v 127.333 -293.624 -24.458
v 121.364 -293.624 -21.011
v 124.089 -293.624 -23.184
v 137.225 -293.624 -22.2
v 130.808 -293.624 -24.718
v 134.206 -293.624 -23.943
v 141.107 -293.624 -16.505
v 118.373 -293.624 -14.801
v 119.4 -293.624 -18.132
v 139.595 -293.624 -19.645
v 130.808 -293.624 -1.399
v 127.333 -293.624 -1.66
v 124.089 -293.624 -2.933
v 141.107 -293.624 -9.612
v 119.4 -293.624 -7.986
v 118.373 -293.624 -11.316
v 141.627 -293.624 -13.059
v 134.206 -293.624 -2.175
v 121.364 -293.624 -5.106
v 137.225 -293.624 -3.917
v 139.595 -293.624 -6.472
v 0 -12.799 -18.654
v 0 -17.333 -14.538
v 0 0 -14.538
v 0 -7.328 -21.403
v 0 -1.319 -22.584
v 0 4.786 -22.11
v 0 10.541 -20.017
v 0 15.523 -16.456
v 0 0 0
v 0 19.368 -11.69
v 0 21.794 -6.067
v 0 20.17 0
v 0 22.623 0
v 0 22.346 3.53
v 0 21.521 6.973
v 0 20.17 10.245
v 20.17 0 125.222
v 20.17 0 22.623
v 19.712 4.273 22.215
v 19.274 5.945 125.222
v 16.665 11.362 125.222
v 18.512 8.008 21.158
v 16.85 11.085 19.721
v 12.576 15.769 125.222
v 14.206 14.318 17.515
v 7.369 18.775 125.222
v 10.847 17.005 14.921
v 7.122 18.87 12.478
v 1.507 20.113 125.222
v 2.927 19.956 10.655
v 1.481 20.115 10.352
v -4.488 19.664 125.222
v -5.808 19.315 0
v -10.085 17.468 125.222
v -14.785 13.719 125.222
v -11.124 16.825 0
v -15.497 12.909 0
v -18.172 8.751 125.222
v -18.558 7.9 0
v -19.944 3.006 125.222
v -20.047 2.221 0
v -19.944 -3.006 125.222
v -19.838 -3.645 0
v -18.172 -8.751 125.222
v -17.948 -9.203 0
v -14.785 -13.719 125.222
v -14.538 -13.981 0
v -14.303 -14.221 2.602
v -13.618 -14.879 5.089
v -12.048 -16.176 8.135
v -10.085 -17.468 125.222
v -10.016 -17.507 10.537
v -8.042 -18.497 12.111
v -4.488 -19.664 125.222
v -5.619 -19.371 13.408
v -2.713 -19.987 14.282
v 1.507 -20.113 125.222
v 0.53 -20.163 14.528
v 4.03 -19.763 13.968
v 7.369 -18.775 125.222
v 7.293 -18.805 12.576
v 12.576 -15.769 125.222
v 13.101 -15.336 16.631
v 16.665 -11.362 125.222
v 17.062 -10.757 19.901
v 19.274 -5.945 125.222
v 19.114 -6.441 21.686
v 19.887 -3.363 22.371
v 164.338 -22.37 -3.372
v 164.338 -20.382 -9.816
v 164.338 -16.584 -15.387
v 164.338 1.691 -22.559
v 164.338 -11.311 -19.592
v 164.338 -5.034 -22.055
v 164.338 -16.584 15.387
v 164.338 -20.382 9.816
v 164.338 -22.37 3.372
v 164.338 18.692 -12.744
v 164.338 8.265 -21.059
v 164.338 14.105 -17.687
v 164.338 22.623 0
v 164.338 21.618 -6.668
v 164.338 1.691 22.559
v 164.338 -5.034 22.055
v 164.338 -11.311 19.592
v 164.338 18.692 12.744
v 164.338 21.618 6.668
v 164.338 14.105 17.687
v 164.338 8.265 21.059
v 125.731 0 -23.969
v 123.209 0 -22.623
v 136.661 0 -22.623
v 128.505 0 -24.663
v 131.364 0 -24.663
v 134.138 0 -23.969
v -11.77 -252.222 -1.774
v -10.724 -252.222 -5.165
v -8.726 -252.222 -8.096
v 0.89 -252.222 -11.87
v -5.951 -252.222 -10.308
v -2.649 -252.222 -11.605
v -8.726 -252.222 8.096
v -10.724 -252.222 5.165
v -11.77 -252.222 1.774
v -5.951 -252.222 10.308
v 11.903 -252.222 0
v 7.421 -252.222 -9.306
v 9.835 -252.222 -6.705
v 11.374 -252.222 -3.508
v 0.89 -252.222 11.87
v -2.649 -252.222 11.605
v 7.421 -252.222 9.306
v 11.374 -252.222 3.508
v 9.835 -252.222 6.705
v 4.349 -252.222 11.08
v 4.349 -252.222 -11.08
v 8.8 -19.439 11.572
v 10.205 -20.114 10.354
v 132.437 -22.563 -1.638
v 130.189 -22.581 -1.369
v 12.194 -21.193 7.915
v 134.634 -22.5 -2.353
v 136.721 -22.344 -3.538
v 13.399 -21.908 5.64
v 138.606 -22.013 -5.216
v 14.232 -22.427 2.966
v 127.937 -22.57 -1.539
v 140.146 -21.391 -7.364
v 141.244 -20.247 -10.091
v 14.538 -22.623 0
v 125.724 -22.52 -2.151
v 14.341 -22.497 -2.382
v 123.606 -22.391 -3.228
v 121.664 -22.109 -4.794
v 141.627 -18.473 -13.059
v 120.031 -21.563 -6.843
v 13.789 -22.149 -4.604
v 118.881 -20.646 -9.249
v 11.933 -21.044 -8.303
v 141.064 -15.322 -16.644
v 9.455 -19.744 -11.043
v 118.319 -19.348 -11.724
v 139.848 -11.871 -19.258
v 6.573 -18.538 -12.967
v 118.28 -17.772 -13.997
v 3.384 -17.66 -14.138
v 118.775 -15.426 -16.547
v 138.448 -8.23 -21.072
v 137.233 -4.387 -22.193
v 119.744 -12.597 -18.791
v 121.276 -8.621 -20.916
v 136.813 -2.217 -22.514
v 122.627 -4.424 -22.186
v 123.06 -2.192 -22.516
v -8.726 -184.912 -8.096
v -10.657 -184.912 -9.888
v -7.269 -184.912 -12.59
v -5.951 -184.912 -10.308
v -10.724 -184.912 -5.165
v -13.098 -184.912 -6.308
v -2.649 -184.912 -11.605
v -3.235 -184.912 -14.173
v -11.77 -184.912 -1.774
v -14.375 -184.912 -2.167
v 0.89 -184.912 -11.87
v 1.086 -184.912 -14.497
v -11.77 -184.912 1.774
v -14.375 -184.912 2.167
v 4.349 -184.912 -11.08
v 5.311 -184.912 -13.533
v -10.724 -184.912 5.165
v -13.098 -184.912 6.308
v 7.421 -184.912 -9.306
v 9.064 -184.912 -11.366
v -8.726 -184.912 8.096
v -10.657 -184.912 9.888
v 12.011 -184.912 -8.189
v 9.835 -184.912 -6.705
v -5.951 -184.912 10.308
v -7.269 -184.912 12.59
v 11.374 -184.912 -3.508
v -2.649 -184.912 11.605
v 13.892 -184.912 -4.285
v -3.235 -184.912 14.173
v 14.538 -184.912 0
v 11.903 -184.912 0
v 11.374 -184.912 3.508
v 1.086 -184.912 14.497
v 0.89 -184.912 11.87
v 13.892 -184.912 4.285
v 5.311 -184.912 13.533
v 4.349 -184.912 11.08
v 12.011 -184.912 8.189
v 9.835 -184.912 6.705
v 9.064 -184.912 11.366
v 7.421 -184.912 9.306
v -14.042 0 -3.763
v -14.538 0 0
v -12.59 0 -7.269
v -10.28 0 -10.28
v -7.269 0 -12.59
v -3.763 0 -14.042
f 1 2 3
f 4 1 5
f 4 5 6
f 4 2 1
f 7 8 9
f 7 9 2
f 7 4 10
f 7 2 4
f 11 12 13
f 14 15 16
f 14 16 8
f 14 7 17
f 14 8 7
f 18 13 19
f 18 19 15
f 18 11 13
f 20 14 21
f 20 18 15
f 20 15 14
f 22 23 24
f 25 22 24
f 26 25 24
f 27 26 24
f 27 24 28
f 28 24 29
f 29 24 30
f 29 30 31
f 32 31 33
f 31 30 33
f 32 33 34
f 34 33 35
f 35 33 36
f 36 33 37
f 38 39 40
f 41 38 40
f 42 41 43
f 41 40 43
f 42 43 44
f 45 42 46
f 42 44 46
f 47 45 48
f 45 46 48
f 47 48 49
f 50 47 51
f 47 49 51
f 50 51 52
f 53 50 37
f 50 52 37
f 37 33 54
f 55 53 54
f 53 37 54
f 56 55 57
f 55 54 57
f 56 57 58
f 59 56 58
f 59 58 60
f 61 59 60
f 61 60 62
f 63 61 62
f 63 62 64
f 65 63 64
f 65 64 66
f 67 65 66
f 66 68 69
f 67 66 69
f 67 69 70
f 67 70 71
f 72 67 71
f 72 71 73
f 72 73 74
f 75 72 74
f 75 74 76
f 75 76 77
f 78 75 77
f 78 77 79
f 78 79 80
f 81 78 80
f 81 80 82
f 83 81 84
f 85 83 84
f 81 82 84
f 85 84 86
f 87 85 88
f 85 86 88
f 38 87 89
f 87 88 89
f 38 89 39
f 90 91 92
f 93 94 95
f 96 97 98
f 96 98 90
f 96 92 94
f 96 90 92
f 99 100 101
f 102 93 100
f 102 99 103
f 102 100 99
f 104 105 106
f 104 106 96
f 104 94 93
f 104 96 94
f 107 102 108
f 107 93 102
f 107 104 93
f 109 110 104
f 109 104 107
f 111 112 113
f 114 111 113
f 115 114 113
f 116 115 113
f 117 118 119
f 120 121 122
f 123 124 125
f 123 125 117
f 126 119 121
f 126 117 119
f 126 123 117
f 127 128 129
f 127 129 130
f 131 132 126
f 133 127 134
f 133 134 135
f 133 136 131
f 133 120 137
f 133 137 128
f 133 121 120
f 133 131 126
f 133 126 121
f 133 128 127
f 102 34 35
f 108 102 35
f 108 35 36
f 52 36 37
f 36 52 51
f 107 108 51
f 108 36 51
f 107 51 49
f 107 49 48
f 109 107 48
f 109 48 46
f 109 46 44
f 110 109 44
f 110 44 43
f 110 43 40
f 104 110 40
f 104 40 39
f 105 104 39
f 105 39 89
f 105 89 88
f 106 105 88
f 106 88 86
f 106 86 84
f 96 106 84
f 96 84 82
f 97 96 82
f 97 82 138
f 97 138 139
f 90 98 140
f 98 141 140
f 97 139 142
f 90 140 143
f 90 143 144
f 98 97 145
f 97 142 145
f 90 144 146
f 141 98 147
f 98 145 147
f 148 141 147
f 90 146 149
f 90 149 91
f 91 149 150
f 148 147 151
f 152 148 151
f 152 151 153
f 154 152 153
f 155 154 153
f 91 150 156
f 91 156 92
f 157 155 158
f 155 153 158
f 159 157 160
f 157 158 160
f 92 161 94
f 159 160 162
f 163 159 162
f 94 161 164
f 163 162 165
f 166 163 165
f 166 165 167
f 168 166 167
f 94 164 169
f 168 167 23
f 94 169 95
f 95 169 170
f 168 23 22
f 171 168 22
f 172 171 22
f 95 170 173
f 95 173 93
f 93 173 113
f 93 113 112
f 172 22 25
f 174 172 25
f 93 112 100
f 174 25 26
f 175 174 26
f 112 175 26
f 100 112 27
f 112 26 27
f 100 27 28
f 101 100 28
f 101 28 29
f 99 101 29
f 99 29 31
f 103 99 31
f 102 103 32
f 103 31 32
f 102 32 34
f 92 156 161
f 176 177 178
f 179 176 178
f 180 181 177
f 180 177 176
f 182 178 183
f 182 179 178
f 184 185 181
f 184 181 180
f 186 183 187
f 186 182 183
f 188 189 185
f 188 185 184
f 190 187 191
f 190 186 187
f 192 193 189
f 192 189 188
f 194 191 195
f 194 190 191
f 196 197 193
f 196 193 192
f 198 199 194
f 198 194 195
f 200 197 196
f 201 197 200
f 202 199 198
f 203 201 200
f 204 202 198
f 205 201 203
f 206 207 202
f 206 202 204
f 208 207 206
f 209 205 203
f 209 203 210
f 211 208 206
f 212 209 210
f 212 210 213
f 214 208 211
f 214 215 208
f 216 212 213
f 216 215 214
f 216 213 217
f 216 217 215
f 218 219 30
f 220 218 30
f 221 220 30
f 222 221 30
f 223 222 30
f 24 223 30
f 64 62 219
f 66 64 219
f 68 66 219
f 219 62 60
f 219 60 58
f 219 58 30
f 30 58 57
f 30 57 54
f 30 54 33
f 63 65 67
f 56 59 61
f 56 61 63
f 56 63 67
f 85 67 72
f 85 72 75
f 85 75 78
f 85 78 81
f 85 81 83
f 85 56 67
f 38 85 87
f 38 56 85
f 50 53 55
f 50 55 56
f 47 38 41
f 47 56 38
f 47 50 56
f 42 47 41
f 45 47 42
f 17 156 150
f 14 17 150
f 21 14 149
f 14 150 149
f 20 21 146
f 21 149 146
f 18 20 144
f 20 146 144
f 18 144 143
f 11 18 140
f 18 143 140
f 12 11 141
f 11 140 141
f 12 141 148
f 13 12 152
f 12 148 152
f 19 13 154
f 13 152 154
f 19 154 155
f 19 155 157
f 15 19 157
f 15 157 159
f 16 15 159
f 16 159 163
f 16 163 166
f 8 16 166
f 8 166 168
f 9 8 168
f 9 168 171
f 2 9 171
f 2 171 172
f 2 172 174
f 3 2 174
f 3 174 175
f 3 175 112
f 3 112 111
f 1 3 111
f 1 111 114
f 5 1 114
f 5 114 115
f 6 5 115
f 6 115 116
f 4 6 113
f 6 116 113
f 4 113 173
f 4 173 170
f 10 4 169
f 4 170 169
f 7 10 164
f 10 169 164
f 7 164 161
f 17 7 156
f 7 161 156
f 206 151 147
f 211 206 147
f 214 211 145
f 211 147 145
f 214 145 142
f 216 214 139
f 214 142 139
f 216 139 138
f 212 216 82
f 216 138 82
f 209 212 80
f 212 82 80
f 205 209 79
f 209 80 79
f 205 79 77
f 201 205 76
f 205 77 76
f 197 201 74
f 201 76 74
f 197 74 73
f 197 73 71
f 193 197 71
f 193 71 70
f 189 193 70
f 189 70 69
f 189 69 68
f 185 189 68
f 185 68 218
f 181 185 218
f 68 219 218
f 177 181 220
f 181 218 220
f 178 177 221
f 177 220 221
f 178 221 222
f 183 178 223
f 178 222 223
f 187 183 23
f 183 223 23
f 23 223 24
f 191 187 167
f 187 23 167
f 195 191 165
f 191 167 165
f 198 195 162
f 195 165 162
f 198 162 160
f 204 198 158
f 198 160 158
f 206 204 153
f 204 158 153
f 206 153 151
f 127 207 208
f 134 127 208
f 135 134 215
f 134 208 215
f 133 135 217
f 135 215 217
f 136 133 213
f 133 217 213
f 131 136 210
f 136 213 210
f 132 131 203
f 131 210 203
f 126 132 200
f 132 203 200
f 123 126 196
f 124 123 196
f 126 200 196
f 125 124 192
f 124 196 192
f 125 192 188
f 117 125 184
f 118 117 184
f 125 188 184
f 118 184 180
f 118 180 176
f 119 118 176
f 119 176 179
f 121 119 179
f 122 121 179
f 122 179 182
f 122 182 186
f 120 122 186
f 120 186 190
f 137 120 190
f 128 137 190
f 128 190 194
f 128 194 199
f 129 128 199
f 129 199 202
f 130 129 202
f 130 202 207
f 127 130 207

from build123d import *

# Parameters (mm, degrees)
F0_R     = 22.622596
F1_DEPTH = 164.338
F2_R     = 11.902986
F3_DEPTH = 252.222
F4_R     = 11.692144
F5_DEPTH = 293.624
F6_R     = 20.169753
F7_DEPTH = 125.222
F8_R     = 14.537522
F9_DEPTH = 184.912


with BuildPart() as f1:
    # F0 (on Right) → F1 (new body)
    with BuildSketch(Plane.YZ):
        Circle(F0_R)
    extrude(amount=F1_DEPTH)

    # F2 (on Front) → F3 (join)
    with BuildSketch(Plane.XZ):
        Circle(F2_R)
    extrude(amount=F3_DEPTH)

    # F4 (on Front) → F5 (join)
    with BuildSketch(Plane.XZ):
        with Locations((129.934579, -13.058762)):
            Circle(F4_R)
    extrude(amount=F5_DEPTH)

    # F6 (on Top) → F7 (join)
    with BuildSketch(Plane.XY):
        Circle(F6_R)
    extrude(amount=F7_DEPTH)

    # F8 (on Front) → F9 (join)
    with BuildSketch(Plane.XZ):
        Circle(F8_R)
    extrude(amount=F9_DEPTH)


solid = f1.part
